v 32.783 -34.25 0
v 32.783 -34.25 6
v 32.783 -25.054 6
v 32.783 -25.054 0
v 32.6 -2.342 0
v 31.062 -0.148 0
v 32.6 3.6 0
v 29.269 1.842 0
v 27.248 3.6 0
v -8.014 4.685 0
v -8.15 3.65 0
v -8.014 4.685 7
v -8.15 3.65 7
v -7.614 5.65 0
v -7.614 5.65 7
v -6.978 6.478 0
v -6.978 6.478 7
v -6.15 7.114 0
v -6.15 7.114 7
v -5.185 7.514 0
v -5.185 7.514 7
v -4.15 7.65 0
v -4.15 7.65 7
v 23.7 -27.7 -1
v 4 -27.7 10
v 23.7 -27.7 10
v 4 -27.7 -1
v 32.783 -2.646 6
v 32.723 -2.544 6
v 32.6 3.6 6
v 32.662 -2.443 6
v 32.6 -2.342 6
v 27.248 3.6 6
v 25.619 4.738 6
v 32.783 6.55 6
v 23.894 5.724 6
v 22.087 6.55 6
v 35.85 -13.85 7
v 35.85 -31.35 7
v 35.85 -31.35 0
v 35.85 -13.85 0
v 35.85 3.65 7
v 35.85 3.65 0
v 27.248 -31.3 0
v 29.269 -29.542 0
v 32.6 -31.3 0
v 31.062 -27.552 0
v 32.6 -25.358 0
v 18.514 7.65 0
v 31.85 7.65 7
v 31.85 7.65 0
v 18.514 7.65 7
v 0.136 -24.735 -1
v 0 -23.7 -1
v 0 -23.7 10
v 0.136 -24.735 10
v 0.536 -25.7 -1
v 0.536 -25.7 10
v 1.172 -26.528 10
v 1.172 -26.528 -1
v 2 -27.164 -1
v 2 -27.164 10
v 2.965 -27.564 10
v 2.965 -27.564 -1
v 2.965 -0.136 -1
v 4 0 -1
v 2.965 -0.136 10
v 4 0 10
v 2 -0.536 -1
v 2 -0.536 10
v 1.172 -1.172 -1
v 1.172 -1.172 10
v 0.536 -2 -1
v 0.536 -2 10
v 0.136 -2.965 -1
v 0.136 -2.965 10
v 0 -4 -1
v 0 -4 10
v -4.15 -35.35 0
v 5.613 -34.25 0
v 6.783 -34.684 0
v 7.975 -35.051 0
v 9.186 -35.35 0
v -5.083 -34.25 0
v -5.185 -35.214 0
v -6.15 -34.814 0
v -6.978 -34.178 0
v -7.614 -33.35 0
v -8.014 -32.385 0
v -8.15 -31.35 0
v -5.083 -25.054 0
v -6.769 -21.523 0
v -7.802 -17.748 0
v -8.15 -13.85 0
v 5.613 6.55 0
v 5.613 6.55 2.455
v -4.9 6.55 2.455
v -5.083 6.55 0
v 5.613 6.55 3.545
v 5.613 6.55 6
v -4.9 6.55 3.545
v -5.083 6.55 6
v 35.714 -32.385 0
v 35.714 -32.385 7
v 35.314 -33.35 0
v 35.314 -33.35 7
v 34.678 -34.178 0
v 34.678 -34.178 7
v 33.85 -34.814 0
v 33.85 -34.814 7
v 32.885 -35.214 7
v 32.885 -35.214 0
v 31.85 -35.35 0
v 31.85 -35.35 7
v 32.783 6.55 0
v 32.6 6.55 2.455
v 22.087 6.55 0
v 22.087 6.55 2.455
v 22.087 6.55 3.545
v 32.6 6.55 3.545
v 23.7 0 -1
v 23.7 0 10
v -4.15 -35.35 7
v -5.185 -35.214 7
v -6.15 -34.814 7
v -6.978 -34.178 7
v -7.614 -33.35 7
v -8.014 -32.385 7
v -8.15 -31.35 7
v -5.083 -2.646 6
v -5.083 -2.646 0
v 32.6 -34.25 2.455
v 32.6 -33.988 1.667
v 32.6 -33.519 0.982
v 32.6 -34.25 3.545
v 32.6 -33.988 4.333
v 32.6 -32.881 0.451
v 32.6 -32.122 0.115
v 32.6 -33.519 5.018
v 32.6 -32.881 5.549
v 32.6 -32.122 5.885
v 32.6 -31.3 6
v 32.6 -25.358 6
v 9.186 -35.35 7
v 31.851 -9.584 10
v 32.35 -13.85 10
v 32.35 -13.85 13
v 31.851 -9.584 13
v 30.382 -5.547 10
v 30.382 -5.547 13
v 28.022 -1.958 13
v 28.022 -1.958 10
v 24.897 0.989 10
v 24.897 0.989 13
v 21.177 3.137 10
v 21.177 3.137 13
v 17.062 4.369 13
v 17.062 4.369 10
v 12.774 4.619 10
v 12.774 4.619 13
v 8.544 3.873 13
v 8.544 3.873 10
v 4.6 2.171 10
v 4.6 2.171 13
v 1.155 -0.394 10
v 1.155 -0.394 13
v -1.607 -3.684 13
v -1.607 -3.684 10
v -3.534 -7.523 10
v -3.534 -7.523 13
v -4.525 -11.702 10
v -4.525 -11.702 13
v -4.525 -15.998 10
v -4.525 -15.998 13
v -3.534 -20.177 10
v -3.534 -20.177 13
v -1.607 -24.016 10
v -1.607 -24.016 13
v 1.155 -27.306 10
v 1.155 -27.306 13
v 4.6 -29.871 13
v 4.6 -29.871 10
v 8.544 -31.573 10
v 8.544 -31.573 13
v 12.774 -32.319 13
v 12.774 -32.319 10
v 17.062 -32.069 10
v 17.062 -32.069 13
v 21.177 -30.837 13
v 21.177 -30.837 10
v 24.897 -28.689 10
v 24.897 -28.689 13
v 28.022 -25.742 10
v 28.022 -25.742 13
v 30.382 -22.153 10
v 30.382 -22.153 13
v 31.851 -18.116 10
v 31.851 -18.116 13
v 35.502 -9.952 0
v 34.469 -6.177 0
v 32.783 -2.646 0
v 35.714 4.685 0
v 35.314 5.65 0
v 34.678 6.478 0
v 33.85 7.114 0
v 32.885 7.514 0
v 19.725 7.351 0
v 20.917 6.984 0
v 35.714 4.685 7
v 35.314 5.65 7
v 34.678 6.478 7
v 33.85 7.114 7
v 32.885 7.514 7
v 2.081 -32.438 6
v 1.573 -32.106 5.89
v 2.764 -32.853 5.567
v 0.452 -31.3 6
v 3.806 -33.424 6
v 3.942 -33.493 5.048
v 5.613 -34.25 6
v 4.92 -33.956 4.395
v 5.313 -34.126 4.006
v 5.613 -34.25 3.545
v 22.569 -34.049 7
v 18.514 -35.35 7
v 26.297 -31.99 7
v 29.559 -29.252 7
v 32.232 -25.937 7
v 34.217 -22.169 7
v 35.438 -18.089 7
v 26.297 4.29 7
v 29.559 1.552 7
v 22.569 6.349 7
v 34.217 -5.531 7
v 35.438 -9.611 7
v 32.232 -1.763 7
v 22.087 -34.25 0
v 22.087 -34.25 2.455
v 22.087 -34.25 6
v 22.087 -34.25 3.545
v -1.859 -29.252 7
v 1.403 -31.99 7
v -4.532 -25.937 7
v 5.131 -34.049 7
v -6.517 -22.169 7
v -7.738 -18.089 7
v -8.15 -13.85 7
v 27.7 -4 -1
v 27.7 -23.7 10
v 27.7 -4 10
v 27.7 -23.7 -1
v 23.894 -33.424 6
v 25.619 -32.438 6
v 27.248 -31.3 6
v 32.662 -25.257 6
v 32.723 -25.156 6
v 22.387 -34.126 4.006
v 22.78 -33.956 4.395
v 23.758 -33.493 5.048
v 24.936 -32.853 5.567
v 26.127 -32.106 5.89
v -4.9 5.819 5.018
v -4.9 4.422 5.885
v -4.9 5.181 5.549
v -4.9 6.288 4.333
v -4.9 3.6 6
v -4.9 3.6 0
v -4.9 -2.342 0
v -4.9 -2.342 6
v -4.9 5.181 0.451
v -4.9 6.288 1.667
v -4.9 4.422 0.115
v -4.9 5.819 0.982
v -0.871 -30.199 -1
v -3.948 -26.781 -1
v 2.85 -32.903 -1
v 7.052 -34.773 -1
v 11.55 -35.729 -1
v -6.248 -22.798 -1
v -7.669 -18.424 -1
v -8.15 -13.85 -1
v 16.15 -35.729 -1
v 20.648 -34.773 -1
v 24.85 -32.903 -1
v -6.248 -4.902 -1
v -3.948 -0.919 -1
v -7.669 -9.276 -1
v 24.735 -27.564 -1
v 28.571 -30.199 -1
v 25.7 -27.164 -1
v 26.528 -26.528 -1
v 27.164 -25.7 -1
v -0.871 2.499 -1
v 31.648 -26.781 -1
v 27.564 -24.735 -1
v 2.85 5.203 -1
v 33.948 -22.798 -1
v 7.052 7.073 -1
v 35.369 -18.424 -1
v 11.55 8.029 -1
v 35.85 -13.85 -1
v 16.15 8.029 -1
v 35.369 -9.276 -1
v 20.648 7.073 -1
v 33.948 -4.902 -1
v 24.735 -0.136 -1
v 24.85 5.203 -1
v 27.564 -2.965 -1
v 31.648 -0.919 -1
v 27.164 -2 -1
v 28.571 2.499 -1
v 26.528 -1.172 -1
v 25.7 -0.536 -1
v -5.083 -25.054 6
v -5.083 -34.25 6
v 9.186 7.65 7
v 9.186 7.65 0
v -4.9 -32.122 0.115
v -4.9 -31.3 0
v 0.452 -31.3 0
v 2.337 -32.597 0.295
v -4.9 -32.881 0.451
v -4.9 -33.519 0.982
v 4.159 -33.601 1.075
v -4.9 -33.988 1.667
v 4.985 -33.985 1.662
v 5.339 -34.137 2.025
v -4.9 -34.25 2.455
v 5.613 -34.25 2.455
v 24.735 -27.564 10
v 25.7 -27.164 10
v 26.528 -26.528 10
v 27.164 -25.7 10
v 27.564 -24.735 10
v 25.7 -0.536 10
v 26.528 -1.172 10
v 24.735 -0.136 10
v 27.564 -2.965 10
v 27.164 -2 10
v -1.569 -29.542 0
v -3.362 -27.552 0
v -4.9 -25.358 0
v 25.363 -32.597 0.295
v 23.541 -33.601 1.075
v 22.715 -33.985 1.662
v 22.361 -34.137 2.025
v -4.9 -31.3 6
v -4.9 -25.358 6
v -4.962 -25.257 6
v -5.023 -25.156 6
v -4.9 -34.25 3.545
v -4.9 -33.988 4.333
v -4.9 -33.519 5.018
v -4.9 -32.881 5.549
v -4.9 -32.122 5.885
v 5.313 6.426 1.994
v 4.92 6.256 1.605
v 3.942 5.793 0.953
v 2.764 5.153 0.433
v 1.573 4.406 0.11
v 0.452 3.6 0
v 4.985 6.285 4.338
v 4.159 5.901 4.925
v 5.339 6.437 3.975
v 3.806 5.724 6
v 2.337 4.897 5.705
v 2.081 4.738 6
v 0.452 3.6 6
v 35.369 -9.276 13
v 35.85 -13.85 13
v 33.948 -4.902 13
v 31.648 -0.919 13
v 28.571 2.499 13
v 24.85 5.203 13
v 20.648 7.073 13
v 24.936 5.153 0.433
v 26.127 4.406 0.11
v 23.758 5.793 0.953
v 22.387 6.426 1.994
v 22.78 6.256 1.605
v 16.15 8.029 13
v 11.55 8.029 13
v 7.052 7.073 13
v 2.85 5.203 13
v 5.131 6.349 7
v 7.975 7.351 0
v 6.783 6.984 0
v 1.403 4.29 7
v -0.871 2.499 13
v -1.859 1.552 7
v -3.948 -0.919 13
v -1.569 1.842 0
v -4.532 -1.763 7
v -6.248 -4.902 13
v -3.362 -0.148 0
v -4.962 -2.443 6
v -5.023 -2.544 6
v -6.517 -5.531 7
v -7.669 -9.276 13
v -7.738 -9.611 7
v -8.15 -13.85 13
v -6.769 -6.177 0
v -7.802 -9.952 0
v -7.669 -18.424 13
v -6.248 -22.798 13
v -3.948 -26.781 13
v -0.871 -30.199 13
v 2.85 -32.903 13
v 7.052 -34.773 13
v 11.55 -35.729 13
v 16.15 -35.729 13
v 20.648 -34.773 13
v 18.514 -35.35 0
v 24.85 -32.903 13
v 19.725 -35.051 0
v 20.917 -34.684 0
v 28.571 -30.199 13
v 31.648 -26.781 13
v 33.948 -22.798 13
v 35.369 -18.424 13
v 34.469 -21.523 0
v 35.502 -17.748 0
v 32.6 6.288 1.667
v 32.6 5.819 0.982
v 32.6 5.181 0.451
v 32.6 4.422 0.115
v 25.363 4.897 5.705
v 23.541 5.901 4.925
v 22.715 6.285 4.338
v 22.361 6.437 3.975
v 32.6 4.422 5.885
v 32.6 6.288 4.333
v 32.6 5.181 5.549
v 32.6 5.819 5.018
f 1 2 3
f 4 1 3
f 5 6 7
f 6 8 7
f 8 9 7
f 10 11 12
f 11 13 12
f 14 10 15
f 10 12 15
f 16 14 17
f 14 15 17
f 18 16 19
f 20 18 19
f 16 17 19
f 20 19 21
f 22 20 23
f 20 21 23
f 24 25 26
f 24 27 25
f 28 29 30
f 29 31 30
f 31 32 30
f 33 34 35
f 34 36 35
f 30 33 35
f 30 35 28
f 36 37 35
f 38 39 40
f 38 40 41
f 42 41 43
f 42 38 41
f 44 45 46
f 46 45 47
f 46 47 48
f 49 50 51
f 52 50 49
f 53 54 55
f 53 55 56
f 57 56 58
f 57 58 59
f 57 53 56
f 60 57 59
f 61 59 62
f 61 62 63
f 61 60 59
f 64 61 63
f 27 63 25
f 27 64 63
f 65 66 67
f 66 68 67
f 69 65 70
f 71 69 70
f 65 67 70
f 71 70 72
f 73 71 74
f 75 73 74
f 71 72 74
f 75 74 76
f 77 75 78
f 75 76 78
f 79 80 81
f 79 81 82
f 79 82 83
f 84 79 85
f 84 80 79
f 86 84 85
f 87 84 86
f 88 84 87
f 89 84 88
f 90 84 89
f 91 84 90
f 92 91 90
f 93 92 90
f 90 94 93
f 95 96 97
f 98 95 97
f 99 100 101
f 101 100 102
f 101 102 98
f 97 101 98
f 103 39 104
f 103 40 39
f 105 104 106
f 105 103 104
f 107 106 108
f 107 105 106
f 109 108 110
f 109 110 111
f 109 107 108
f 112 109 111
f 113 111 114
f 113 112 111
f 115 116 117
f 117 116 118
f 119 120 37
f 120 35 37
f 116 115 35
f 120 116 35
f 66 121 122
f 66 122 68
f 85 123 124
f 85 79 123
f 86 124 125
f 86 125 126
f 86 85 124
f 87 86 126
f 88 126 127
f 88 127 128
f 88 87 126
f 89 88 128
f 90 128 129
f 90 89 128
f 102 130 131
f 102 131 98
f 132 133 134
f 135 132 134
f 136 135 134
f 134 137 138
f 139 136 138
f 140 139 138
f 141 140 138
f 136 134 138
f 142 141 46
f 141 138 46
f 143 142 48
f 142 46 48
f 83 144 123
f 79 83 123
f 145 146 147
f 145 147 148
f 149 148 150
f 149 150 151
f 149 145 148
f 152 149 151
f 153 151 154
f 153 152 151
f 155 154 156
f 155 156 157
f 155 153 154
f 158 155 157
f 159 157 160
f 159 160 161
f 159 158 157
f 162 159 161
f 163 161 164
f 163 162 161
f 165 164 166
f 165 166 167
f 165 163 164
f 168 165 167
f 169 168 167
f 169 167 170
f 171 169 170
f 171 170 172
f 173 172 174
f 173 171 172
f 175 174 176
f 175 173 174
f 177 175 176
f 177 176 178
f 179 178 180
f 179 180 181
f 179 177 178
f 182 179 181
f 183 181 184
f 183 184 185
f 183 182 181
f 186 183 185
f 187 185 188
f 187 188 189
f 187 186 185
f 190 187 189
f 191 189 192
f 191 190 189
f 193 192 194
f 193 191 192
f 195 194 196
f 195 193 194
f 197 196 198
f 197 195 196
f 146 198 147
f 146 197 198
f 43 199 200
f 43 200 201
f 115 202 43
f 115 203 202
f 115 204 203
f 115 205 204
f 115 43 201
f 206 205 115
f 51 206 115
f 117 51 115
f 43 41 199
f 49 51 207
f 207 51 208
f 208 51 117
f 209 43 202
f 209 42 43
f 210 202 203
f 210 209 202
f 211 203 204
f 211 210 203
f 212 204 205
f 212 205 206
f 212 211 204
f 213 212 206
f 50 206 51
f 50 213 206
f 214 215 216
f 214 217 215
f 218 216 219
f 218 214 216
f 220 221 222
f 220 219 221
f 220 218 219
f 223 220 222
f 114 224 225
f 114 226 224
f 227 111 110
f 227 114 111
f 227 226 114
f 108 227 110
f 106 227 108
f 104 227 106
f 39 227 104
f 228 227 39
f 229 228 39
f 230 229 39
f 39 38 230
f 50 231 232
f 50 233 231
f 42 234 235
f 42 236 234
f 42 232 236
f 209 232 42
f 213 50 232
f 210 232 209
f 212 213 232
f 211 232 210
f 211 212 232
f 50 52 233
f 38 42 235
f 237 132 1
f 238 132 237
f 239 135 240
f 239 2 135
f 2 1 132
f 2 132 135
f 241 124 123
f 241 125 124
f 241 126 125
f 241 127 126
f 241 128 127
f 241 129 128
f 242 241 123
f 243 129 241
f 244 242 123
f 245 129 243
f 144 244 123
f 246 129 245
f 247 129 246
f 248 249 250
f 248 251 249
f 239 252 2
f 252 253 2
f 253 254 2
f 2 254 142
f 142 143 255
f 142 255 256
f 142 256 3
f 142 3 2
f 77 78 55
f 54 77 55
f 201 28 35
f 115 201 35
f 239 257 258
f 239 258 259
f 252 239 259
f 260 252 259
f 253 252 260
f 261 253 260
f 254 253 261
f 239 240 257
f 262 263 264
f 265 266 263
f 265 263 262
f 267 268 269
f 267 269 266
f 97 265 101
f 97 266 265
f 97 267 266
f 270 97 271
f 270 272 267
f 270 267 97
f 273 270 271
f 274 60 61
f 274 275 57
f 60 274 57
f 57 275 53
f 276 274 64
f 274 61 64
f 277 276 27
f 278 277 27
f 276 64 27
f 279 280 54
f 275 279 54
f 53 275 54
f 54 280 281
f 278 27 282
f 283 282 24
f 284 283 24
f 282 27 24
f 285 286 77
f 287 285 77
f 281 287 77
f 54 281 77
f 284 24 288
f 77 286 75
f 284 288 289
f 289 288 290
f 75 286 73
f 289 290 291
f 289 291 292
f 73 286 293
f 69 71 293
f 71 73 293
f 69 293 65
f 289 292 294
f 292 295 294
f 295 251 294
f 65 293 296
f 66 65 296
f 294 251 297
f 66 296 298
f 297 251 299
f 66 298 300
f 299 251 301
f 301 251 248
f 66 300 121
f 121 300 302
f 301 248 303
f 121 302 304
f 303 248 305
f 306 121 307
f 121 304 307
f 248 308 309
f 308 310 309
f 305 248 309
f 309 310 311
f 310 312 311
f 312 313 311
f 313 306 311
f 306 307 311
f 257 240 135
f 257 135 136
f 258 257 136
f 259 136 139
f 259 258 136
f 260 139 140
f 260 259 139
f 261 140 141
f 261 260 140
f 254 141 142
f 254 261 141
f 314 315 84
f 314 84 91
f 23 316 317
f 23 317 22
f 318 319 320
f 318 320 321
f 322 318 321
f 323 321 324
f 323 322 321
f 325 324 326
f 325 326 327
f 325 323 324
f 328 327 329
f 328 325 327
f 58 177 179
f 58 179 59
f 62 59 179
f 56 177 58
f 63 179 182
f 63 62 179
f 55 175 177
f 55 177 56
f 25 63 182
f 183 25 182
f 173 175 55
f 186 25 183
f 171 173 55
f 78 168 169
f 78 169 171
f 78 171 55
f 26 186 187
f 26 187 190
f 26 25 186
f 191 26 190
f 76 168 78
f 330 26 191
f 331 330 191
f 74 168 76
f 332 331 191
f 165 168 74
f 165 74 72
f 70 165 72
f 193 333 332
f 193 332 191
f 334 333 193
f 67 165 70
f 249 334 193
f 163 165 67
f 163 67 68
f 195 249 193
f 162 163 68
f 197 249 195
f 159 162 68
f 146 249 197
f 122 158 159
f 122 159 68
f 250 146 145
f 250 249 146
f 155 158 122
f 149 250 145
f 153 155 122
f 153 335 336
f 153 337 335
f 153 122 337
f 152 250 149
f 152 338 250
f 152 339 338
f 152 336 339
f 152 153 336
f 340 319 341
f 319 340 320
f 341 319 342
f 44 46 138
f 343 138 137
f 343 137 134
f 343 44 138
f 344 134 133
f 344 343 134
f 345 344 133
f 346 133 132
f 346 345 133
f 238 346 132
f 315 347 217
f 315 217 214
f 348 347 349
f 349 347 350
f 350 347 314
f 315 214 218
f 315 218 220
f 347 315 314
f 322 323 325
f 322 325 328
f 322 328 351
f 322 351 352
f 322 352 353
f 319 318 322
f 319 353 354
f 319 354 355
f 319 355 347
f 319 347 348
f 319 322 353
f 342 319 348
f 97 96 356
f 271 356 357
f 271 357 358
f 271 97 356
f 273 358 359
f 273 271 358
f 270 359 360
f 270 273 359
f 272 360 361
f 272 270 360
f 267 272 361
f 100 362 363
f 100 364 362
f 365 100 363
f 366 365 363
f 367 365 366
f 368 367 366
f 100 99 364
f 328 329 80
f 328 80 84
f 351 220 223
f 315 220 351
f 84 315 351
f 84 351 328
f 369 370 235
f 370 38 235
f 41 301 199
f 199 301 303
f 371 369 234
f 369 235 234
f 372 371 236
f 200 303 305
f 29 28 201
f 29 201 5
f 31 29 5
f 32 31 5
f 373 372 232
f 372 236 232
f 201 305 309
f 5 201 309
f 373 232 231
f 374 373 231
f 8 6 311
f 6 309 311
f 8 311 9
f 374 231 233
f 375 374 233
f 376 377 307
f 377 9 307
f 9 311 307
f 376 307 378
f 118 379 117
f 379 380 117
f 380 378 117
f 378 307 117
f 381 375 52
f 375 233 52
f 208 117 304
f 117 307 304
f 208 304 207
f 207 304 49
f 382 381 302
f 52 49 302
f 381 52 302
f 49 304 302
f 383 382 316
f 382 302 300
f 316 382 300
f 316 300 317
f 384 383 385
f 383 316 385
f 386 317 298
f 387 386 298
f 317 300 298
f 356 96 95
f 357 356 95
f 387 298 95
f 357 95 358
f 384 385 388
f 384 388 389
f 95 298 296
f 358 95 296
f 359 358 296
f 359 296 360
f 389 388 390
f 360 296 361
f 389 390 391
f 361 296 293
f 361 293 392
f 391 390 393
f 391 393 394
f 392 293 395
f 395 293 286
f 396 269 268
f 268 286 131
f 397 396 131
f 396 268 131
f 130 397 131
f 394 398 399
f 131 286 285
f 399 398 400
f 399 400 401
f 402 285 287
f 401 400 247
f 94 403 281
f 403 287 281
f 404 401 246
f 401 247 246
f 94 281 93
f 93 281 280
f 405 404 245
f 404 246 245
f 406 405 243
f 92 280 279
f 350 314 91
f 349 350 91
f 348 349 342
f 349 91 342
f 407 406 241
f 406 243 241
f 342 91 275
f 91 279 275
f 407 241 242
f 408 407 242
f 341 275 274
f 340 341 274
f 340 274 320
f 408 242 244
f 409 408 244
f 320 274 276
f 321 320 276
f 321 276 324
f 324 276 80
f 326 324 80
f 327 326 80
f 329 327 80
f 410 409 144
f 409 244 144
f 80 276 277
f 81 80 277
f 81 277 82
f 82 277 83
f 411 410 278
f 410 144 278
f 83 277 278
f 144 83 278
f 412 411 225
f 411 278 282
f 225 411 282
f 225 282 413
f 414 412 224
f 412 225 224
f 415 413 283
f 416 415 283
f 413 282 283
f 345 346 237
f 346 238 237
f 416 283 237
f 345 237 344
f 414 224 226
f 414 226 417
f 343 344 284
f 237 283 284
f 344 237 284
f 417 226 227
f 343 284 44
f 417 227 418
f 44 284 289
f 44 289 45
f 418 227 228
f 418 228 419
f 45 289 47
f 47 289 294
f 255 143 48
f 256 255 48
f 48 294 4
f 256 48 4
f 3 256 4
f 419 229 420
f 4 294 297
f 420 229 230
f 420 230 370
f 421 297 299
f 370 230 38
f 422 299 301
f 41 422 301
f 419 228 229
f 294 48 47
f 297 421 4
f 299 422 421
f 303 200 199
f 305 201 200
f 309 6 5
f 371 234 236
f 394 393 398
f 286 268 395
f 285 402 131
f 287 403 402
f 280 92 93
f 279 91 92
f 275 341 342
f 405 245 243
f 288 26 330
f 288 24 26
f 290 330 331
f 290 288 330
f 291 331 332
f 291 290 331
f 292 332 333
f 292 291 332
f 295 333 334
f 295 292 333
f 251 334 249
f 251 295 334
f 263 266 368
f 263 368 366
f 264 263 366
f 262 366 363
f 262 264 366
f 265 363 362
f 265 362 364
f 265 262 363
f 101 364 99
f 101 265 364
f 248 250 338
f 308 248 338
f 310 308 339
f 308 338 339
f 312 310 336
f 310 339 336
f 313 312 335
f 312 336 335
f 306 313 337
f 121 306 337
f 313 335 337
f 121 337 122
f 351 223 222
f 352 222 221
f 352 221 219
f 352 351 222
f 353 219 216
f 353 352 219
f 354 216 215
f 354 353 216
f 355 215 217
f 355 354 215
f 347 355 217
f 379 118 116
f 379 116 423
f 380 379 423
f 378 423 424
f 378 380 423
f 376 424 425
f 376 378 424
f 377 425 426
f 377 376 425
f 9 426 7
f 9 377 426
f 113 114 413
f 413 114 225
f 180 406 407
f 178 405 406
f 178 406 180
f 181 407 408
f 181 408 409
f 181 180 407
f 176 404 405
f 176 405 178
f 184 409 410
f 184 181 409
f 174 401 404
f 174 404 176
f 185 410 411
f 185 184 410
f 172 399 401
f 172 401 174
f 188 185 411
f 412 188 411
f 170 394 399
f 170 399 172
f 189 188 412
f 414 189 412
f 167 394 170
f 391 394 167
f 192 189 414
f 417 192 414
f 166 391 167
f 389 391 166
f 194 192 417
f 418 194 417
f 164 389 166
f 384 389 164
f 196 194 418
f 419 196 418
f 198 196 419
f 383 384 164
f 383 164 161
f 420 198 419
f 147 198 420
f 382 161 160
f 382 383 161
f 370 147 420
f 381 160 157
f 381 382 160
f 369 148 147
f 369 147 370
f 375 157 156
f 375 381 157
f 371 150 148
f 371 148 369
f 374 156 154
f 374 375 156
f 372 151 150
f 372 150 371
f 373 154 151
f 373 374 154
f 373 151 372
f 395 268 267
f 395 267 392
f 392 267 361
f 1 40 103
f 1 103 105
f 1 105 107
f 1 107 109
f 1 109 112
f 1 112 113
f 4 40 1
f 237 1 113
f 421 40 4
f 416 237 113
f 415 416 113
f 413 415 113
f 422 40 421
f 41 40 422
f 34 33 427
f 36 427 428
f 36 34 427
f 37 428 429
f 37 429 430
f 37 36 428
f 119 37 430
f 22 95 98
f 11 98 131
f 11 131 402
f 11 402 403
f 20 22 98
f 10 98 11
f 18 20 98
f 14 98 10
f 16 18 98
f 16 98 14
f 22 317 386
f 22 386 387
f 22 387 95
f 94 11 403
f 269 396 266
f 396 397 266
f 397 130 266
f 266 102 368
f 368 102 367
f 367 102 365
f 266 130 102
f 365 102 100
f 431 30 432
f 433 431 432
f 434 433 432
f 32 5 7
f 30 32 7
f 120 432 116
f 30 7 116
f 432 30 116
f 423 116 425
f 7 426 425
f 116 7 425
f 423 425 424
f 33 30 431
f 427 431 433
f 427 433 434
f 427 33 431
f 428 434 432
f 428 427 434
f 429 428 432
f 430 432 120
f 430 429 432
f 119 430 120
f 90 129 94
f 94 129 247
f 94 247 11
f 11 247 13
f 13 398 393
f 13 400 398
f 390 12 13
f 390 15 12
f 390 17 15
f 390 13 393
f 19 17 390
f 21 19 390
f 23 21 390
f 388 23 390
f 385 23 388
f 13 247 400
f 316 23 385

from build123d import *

# Parameters (mm, degrees)
SKETCH1_W                = 37.5
SKETCH1_H                = 40.9
SKETCH1_W_2              = 27.7
SKETCH1_H_2              = 27.7
BOSS_EXTRUDE1_DEPTH      = 6
SKETCH4_W                = 16.432066976
SKETCH4_H                = 47.432770651
CUT_EXTRUDE1_DEPTH       = 46
SKETCH5_W                = 44
SKETCH5_H                = 43
BOSS_EXTRUDE2_DEPTH      = 1
CUT_EXTRUDE2_DEPTH       = 1
SKETCH7_W                = 44
SKETCH7_H                = 43
SKETCH7_W_2              = 37.866148728
SKETCH7_H_2              = 40.8
BOSS_EXTRUDE3_DEPTH      = 6
FILLET1_R                = 4
SKETCH8_R                = 22
BOSS_EXTRUDE4_DEPTH      = 3
BOSS_EXTRUDE4_DEPTH_BACK = 8
SKETCH9_R                = 22
SKETCH9_R_2              = 18.5
BOSS_EXTRUDE5_DEPTH      = 3


with BuildPart() as part:
    # Sketch1 → Boss-Extrude1 (new body)
    with BuildSketch(Plane.XY):
        with Locations((13.85, -13.85)):
            Rectangle(SKETCH1_W, SKETCH1_H)
        with Locations((13.85, -13.85)):
            Rectangle(SKETCH1_W_2, SKETCH1_H_2, mode=Mode.SUBTRACT)
    extrude(amount=BOSS_EXTRUDE1_DEPTH)

    # Sketch4 → Cut-Extrude1 (cut)
    with BuildSketch(Plane.ZY.offset(4.9)):
        with Locations((3.592909633, -13.002986239)):
            Rectangle(SKETCH4_W, SKETCH4_H)
        with BuildLine():
            Line((0, 3.6), (0, -31.3))
            ThreePointArc((0, -31.3), (3, -34.3), (6, -31.3))
            Line((6, -31.3), (6, 3.6))
            ThreePointArc((6, 3.6), (3, 6.6), (0, 3.6))
        make_face(mode=Mode.SUBTRACT)
    extrude(amount=-CUT_EXTRUDE1_DEPTH, mode=Mode.SUBTRACT)

    # Sketch5 → Boss-Extrude2 (add)
    with BuildSketch(Plane.XY.offset(6)):
        with Locations((13.85, -13.85)):
            Rectangle(SKETCH5_W, SKETCH5_H)
    extrude(amount=BOSS_EXTRUDE2_DEPTH)

    # Sketch6 → Cut-Extrude2 (cut)
    with BuildSketch(Plane.XY.offset(7)):
        with BuildLine():
            Line((4, -27.7), (23.7, -27.7))
            ThreePointArc((23.7, -27.7), (26.528427125, -26.528427125), (27.7, -23.7))
            Line((27.7, -23.7), (27.7, -4))
            ThreePointArc((27.7, -4), (26.528427125, -1.171572875), (23.7, 0))
            Line((23.7, 0), (4, 0))
            ThreePointArc((4, 0), (1.171572875, -1.171572875), (0, -4))
            Line((0, -4), (0, -23.7))
            ThreePointArc((0, -23.7), (1.171572875, -26.528427125), (4, -27.7))
        make_face()
    extrude(amount=-CUT_EXTRUDE2_DEPTH, mode=Mode.SUBTRACT)

    # Sketch7 → Boss-Extrude3 (add)
    with BuildSketch(Plane(origin=(0, 0, 6), x_dir=(-1, 0, 0), z_dir=(0, 0, -1))):
        with Locations((-13.85, -13.85)):
            Rectangle(SKETCH7_W, SKETCH7_H)
        with Locations((-13.85, -13.85)):
            Rectangle(SKETCH7_W_2, SKETCH7_H_2, mode=Mode.SUBTRACT)
    extrude(amount=BOSS_EXTRUDE3_DEPTH)

    # Fillet1
    fillet1_edges = [part.edges().sort_by_distance(p)[0] for p in [
        (35.85, -35.35, 3.5),
        (35.85, 7.65, 3.5),
        (-8.15, 7.65, 3.5),
        (-8.15, -35.35, 3.5),
    ]]
    fillet(fillet1_edges, radius=FILLET1_R)

    # Sketch8 → Boss-Extrude4 (add, two sides)
    with BuildSketch(Plane.XY.offset(7)) as boss_extrude4_sk:
        with Locations((13.85, -13.85)):
            Circle(SKETCH8_R)
        with BuildLine():
            Line((27.7, -23.7), (27.7, -4))
            ThreePointArc((27.7, -4), (26.528427125, -1.171572875), (23.7, 0))
            Line((23.7, 0), (4, 0))
            ThreePointArc((4, 0), (1.171572875, -1.171572875), (0, -4))
            Line((0, -4), (0, -23.7))
            ThreePointArc((0, -23.7), (1.171572875, -26.528427125), (4, -27.7))
            Line((4, -27.7), (23.7, -27.7))
            ThreePointArc((23.7, -27.7), (26.528427125, -26.528427125), (27.7, -23.7))
        make_face(mode=Mode.SUBTRACT)
    extrude(amount=BOSS_EXTRUDE4_DEPTH)
    extrude(boss_extrude4_sk.sketch, amount=-BOSS_EXTRUDE4_DEPTH_BACK)

    # Sketch9 → Boss-Extrude5 (add)
    with BuildSketch(Plane.XY.offset(10)):
        with Locations((13.85, -13.85)):
            Circle(SKETCH9_R)
        with Locations((13.85, -13.85)):
            Circle(SKETCH9_R_2, mode=Mode.SUBTRACT)
    extrude(amount=BOSS_EXTRUDE5_DEPTH)


solid = part.part
